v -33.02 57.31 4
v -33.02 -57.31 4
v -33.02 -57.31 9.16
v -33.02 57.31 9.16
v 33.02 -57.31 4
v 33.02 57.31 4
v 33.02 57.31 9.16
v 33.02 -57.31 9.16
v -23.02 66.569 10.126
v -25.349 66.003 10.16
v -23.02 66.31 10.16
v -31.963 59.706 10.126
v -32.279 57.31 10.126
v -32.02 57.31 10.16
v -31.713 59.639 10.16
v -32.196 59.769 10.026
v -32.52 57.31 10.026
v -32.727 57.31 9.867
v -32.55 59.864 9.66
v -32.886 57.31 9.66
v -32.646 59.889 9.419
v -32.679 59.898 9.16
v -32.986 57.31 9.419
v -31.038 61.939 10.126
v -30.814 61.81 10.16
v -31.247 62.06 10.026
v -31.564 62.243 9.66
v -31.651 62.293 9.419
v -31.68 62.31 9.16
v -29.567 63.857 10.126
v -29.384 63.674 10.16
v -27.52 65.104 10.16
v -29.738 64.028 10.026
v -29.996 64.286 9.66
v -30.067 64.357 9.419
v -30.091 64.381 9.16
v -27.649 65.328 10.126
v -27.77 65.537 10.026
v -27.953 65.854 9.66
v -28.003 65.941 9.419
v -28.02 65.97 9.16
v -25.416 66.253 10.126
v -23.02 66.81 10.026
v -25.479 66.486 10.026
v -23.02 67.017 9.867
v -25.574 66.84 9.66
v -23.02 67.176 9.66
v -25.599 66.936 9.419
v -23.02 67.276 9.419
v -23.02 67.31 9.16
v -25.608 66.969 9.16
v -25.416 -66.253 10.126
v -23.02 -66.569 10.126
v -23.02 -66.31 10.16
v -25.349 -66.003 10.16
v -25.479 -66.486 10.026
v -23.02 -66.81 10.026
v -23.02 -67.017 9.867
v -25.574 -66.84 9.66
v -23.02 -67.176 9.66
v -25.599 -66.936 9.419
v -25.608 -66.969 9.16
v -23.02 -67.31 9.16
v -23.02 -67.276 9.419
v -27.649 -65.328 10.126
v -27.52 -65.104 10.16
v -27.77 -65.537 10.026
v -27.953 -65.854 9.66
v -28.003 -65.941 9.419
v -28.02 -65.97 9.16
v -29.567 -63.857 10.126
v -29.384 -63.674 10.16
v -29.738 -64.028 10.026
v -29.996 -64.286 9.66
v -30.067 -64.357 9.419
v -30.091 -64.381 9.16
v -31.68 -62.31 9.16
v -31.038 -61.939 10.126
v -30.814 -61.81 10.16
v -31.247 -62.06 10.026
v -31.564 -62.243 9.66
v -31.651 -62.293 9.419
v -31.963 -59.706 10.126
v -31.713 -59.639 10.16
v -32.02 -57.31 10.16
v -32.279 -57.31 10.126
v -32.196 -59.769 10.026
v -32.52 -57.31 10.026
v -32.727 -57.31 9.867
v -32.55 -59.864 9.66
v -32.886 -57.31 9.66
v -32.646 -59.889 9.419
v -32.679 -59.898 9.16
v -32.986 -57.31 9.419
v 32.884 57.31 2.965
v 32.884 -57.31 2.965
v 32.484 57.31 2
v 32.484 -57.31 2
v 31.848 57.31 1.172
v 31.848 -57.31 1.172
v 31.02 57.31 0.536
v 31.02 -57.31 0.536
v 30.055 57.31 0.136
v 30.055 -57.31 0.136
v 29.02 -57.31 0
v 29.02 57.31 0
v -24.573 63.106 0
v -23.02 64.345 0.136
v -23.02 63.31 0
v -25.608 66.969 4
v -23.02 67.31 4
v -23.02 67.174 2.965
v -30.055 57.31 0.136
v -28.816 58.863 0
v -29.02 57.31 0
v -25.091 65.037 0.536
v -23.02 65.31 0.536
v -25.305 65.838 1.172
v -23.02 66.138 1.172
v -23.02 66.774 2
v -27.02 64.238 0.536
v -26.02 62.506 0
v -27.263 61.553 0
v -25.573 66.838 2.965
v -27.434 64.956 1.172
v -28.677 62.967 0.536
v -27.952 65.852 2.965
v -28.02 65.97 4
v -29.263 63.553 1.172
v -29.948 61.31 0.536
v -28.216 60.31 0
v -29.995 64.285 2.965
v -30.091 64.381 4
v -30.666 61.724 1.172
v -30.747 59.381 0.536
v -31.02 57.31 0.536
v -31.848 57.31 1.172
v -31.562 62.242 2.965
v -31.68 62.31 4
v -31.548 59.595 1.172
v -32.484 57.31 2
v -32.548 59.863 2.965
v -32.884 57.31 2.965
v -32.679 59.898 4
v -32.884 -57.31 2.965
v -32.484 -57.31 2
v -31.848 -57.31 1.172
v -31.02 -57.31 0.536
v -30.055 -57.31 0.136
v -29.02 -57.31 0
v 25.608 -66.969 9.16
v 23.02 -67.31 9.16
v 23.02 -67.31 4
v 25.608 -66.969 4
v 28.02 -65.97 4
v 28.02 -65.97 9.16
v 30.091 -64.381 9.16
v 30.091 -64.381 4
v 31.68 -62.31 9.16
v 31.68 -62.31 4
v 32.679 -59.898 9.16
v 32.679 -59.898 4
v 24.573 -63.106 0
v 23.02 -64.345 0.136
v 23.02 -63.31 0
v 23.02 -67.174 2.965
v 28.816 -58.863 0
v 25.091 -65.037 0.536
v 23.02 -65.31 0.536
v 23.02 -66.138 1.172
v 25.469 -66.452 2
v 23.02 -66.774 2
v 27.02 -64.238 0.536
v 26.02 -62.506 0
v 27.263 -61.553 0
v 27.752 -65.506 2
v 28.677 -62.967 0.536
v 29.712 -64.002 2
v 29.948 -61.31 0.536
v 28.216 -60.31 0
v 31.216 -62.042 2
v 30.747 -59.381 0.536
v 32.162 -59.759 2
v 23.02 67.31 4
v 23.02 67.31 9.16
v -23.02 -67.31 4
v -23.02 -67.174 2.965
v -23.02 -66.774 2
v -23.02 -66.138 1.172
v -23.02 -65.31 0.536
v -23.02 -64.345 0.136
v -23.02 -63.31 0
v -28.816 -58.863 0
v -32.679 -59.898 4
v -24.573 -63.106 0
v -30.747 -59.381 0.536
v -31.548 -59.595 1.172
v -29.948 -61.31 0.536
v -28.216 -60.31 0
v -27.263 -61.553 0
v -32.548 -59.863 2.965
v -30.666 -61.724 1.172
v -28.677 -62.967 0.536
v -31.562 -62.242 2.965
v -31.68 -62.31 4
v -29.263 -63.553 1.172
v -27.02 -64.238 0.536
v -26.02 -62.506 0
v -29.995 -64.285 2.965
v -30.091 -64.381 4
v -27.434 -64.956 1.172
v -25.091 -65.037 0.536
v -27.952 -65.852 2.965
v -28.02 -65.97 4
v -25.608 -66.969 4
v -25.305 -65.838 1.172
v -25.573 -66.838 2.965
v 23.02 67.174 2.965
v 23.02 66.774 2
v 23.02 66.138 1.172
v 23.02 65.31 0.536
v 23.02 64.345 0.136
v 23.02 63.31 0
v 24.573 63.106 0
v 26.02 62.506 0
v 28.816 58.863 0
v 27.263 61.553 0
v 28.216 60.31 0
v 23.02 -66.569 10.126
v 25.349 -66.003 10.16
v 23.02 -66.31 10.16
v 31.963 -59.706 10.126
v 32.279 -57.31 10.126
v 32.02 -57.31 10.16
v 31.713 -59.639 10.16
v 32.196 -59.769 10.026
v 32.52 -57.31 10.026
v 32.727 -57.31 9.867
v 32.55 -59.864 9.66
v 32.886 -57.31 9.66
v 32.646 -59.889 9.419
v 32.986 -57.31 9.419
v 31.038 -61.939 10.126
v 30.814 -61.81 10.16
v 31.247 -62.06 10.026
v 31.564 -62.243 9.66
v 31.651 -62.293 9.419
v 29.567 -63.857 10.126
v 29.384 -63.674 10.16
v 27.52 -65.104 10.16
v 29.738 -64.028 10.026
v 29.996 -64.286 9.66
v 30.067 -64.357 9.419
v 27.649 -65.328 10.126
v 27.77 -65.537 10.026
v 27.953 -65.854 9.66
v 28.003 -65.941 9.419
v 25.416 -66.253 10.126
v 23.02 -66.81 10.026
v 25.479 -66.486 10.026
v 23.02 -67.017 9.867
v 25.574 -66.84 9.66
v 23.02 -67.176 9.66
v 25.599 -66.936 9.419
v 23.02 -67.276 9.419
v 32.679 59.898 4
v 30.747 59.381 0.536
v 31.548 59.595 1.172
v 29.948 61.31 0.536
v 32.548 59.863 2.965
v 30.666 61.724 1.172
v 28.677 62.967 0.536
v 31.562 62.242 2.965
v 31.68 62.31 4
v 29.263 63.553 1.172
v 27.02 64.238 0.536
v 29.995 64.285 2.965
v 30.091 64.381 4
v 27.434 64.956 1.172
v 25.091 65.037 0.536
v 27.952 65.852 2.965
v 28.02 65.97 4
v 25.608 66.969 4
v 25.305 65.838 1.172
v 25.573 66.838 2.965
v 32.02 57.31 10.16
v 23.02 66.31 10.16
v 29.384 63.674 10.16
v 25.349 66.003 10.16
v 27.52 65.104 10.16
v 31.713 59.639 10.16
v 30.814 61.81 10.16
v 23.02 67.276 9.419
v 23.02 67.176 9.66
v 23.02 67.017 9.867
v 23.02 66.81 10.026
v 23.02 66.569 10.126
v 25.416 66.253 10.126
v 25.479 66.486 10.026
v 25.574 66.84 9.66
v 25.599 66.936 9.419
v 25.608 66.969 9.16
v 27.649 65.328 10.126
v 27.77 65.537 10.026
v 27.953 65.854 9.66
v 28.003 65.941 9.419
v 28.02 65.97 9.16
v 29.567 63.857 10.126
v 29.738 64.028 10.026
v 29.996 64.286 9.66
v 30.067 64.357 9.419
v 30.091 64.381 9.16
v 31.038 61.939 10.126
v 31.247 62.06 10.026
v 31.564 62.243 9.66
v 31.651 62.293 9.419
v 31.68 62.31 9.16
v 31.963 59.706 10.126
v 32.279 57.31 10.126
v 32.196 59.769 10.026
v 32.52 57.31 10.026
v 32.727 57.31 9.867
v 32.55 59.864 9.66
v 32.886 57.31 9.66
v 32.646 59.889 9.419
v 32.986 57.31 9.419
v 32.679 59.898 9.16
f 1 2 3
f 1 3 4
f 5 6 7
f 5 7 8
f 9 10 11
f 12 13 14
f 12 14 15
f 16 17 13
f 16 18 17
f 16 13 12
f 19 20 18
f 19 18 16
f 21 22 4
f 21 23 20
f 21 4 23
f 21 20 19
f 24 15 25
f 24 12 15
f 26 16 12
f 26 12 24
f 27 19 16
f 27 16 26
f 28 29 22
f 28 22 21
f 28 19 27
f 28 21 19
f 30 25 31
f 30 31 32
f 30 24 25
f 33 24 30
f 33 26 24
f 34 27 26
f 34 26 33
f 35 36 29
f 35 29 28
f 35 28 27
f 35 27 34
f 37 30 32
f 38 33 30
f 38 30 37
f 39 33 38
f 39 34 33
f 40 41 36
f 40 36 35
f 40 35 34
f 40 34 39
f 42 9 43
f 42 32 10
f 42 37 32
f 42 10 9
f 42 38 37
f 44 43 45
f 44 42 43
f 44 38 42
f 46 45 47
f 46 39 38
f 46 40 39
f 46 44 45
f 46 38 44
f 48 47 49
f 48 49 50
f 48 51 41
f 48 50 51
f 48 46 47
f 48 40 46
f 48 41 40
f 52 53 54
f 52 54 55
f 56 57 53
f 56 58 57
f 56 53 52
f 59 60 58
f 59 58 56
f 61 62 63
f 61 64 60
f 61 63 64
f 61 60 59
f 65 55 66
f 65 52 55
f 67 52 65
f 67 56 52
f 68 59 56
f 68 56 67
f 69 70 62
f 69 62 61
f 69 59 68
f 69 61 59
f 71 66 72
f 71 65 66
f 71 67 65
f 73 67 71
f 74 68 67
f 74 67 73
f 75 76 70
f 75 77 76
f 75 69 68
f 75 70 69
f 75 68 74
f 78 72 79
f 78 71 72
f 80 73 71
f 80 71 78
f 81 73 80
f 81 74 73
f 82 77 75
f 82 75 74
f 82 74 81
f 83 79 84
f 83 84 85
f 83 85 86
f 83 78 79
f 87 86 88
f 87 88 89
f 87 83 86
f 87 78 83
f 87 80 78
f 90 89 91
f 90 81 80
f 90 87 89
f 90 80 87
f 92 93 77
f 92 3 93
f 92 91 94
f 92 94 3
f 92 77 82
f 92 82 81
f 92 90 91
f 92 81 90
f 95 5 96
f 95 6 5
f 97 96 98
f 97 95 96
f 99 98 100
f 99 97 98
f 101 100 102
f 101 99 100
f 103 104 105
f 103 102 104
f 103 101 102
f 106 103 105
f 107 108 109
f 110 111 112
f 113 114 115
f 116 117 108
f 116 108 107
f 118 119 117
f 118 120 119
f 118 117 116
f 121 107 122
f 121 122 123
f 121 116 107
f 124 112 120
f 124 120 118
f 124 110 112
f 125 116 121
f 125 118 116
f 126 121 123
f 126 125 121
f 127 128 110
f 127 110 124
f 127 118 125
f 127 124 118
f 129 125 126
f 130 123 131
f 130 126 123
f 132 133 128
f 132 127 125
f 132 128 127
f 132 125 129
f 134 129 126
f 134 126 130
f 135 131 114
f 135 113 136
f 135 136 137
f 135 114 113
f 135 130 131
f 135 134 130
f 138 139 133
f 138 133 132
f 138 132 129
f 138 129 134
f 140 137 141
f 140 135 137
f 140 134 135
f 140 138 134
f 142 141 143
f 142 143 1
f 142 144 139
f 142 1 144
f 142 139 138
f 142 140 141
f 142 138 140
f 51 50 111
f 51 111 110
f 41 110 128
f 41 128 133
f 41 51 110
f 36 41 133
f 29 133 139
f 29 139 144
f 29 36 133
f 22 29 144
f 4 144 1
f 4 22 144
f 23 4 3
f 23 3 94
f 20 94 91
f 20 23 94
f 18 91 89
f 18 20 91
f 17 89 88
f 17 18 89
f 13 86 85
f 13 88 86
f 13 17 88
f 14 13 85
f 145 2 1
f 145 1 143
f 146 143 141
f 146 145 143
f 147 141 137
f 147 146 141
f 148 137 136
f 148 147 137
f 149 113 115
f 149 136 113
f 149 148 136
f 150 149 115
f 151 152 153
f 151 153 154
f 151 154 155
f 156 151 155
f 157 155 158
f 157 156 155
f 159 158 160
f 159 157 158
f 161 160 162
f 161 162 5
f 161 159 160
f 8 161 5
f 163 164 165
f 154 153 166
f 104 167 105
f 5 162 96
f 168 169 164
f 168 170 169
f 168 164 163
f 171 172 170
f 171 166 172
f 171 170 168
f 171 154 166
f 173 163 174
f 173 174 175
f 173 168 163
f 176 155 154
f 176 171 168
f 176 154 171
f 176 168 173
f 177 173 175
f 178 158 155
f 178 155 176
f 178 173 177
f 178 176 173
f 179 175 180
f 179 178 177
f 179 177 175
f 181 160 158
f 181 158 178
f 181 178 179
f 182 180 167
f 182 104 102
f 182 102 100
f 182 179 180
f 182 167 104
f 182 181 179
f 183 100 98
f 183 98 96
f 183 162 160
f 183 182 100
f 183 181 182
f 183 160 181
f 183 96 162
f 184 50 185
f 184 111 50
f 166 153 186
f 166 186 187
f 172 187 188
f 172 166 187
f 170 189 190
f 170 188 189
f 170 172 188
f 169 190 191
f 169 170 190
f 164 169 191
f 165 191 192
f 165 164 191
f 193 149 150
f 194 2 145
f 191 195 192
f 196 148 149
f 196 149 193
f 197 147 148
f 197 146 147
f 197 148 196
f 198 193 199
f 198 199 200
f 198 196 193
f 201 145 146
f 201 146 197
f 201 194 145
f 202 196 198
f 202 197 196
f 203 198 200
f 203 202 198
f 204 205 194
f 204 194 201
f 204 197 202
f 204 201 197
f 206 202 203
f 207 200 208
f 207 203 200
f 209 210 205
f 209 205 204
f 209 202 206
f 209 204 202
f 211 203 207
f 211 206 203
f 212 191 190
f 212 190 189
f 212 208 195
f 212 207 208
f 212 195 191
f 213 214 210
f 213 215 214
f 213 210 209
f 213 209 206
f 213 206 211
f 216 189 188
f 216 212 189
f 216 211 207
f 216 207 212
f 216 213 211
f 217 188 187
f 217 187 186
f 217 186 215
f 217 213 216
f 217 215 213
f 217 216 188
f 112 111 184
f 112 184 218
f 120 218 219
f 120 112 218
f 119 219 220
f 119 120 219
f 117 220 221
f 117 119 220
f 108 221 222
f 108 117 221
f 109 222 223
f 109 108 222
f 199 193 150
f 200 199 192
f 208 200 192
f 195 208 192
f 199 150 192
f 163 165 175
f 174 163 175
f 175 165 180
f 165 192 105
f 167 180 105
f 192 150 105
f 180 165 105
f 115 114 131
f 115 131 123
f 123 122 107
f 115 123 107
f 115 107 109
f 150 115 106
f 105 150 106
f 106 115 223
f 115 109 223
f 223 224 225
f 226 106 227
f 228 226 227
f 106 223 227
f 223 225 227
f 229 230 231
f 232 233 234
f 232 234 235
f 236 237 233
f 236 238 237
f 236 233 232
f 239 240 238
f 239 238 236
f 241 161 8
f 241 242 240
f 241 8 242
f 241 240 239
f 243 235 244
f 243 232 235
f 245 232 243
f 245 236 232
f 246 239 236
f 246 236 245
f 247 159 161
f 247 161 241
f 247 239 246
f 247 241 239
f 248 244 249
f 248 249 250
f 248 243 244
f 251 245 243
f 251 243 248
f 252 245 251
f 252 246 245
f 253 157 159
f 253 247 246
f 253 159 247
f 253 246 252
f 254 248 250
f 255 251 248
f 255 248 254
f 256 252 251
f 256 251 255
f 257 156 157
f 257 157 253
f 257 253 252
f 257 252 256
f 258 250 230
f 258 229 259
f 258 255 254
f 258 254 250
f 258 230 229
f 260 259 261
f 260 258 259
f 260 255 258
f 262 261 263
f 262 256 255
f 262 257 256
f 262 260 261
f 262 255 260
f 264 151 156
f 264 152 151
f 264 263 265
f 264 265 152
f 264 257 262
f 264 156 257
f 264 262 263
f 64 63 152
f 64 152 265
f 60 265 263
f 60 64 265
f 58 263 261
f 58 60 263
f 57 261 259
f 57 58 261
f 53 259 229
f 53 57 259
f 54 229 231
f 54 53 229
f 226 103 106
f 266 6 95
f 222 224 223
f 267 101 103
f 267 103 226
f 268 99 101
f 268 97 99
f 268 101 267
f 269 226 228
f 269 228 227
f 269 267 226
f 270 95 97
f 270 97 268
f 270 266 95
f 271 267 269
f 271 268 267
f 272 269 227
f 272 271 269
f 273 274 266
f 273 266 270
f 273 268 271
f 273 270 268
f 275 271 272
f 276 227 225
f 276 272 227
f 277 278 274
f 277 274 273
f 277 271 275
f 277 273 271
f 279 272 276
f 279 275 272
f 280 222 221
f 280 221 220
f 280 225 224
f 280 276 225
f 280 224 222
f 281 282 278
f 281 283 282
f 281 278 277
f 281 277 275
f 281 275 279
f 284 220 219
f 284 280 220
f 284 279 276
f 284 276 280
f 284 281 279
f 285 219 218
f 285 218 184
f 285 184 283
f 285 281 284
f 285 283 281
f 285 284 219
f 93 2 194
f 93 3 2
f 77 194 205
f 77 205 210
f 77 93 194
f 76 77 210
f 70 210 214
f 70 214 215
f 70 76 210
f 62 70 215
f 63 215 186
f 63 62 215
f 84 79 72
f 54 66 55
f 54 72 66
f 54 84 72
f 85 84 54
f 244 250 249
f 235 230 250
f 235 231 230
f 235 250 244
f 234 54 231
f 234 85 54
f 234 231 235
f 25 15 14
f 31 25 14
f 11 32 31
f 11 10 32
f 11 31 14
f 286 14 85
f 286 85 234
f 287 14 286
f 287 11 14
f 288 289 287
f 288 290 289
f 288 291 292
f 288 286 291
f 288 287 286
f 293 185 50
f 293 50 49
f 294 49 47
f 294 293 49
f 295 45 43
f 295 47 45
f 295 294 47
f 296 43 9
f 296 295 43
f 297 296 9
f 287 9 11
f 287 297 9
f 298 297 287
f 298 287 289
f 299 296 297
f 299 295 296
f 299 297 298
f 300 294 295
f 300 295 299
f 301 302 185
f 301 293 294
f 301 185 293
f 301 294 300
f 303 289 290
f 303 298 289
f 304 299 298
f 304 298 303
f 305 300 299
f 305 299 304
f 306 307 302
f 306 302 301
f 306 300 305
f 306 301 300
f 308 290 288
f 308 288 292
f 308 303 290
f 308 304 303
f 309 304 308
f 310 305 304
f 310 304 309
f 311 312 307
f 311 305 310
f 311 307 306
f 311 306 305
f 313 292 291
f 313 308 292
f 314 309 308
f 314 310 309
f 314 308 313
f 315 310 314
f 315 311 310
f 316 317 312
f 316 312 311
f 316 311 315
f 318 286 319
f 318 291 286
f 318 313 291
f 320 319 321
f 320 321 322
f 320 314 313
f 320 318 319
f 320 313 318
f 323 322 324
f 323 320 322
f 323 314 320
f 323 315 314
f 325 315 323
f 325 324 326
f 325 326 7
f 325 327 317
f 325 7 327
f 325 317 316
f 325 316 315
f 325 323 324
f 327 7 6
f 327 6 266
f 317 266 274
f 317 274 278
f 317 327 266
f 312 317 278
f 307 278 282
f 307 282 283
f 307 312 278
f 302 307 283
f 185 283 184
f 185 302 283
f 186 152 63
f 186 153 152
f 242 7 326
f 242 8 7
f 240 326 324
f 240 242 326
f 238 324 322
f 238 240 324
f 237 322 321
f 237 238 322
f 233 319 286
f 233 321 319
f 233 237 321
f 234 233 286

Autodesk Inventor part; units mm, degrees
ref_plane "YZ Plane" through (0, 0, 0) normal (1, 0, 0) x (0, 1, 0)
ref_plane "XZ Plane" through (0, 0, 0) normal (0, 1, 0) x (-1, 0, 0)
ref_plane "XY Plane" through (0, 0, 0) normal (0, 0, 1) x (1, 0, 0)
sketch "Sketch1" plane through (0, 0, 0) normal (0, 0, 1) x (1, 0, 0)
  line L0 (33.02, -67.31) -> (-33.02, -67.31)
  line L1 (-33.02, -67.31) -> (-33.02, 67.31)
  line L2 (-33.02, 67.31) -> (33.02, 67.31)
  line L3 (33.02, 67.31) -> (33.02, -67.31)
  line L4 (33.02, -67.31) -> (-33.02, 67.31) construction
  line L5 (-33.02, -67.31) -> (33.02, 67.31) construction
  point P0 (0, 0)
  dimension "d0" = 66.04
  dimension "d1" = 134.62
extrude "Extrusion1" add sketch "Sketch1" along normal blind 10.16
fillet "Fillet1" radius 10 4 edges at (33.02, 67.31, 5.08) (-33.02, 67.31, 5.08) (33.02, -67.31, 5.08) (-33.02, -67.31, 5.08)
fillet "Fillet2" radius 4 8 edges at (30.0911, -64.3811, 0) (0, -67.31, 0) (-30.0911, -64.3811, 0) (-33.02, 0, 0) (-30.0911, 64.3811, 0) (0, 67.31, 0) (30.0911, 64.3811, 0) (33.02, 0, 0)
fillet "Fillet3" radius 1 8 edges at (30.0911, 64.3811, 10.16) (0, 67.31, 10.16) (-30.0911, 64.3811, 10.16) (-33.02, 0, 10.16) (-30.0911, -64.3811, 10.16) (0, -67.31, 10.16) (30.0911, -64.3811, 10.16) (33.02, 0, 10.16)
properties part number "Andoid Phone" material "ABS Plastic"
